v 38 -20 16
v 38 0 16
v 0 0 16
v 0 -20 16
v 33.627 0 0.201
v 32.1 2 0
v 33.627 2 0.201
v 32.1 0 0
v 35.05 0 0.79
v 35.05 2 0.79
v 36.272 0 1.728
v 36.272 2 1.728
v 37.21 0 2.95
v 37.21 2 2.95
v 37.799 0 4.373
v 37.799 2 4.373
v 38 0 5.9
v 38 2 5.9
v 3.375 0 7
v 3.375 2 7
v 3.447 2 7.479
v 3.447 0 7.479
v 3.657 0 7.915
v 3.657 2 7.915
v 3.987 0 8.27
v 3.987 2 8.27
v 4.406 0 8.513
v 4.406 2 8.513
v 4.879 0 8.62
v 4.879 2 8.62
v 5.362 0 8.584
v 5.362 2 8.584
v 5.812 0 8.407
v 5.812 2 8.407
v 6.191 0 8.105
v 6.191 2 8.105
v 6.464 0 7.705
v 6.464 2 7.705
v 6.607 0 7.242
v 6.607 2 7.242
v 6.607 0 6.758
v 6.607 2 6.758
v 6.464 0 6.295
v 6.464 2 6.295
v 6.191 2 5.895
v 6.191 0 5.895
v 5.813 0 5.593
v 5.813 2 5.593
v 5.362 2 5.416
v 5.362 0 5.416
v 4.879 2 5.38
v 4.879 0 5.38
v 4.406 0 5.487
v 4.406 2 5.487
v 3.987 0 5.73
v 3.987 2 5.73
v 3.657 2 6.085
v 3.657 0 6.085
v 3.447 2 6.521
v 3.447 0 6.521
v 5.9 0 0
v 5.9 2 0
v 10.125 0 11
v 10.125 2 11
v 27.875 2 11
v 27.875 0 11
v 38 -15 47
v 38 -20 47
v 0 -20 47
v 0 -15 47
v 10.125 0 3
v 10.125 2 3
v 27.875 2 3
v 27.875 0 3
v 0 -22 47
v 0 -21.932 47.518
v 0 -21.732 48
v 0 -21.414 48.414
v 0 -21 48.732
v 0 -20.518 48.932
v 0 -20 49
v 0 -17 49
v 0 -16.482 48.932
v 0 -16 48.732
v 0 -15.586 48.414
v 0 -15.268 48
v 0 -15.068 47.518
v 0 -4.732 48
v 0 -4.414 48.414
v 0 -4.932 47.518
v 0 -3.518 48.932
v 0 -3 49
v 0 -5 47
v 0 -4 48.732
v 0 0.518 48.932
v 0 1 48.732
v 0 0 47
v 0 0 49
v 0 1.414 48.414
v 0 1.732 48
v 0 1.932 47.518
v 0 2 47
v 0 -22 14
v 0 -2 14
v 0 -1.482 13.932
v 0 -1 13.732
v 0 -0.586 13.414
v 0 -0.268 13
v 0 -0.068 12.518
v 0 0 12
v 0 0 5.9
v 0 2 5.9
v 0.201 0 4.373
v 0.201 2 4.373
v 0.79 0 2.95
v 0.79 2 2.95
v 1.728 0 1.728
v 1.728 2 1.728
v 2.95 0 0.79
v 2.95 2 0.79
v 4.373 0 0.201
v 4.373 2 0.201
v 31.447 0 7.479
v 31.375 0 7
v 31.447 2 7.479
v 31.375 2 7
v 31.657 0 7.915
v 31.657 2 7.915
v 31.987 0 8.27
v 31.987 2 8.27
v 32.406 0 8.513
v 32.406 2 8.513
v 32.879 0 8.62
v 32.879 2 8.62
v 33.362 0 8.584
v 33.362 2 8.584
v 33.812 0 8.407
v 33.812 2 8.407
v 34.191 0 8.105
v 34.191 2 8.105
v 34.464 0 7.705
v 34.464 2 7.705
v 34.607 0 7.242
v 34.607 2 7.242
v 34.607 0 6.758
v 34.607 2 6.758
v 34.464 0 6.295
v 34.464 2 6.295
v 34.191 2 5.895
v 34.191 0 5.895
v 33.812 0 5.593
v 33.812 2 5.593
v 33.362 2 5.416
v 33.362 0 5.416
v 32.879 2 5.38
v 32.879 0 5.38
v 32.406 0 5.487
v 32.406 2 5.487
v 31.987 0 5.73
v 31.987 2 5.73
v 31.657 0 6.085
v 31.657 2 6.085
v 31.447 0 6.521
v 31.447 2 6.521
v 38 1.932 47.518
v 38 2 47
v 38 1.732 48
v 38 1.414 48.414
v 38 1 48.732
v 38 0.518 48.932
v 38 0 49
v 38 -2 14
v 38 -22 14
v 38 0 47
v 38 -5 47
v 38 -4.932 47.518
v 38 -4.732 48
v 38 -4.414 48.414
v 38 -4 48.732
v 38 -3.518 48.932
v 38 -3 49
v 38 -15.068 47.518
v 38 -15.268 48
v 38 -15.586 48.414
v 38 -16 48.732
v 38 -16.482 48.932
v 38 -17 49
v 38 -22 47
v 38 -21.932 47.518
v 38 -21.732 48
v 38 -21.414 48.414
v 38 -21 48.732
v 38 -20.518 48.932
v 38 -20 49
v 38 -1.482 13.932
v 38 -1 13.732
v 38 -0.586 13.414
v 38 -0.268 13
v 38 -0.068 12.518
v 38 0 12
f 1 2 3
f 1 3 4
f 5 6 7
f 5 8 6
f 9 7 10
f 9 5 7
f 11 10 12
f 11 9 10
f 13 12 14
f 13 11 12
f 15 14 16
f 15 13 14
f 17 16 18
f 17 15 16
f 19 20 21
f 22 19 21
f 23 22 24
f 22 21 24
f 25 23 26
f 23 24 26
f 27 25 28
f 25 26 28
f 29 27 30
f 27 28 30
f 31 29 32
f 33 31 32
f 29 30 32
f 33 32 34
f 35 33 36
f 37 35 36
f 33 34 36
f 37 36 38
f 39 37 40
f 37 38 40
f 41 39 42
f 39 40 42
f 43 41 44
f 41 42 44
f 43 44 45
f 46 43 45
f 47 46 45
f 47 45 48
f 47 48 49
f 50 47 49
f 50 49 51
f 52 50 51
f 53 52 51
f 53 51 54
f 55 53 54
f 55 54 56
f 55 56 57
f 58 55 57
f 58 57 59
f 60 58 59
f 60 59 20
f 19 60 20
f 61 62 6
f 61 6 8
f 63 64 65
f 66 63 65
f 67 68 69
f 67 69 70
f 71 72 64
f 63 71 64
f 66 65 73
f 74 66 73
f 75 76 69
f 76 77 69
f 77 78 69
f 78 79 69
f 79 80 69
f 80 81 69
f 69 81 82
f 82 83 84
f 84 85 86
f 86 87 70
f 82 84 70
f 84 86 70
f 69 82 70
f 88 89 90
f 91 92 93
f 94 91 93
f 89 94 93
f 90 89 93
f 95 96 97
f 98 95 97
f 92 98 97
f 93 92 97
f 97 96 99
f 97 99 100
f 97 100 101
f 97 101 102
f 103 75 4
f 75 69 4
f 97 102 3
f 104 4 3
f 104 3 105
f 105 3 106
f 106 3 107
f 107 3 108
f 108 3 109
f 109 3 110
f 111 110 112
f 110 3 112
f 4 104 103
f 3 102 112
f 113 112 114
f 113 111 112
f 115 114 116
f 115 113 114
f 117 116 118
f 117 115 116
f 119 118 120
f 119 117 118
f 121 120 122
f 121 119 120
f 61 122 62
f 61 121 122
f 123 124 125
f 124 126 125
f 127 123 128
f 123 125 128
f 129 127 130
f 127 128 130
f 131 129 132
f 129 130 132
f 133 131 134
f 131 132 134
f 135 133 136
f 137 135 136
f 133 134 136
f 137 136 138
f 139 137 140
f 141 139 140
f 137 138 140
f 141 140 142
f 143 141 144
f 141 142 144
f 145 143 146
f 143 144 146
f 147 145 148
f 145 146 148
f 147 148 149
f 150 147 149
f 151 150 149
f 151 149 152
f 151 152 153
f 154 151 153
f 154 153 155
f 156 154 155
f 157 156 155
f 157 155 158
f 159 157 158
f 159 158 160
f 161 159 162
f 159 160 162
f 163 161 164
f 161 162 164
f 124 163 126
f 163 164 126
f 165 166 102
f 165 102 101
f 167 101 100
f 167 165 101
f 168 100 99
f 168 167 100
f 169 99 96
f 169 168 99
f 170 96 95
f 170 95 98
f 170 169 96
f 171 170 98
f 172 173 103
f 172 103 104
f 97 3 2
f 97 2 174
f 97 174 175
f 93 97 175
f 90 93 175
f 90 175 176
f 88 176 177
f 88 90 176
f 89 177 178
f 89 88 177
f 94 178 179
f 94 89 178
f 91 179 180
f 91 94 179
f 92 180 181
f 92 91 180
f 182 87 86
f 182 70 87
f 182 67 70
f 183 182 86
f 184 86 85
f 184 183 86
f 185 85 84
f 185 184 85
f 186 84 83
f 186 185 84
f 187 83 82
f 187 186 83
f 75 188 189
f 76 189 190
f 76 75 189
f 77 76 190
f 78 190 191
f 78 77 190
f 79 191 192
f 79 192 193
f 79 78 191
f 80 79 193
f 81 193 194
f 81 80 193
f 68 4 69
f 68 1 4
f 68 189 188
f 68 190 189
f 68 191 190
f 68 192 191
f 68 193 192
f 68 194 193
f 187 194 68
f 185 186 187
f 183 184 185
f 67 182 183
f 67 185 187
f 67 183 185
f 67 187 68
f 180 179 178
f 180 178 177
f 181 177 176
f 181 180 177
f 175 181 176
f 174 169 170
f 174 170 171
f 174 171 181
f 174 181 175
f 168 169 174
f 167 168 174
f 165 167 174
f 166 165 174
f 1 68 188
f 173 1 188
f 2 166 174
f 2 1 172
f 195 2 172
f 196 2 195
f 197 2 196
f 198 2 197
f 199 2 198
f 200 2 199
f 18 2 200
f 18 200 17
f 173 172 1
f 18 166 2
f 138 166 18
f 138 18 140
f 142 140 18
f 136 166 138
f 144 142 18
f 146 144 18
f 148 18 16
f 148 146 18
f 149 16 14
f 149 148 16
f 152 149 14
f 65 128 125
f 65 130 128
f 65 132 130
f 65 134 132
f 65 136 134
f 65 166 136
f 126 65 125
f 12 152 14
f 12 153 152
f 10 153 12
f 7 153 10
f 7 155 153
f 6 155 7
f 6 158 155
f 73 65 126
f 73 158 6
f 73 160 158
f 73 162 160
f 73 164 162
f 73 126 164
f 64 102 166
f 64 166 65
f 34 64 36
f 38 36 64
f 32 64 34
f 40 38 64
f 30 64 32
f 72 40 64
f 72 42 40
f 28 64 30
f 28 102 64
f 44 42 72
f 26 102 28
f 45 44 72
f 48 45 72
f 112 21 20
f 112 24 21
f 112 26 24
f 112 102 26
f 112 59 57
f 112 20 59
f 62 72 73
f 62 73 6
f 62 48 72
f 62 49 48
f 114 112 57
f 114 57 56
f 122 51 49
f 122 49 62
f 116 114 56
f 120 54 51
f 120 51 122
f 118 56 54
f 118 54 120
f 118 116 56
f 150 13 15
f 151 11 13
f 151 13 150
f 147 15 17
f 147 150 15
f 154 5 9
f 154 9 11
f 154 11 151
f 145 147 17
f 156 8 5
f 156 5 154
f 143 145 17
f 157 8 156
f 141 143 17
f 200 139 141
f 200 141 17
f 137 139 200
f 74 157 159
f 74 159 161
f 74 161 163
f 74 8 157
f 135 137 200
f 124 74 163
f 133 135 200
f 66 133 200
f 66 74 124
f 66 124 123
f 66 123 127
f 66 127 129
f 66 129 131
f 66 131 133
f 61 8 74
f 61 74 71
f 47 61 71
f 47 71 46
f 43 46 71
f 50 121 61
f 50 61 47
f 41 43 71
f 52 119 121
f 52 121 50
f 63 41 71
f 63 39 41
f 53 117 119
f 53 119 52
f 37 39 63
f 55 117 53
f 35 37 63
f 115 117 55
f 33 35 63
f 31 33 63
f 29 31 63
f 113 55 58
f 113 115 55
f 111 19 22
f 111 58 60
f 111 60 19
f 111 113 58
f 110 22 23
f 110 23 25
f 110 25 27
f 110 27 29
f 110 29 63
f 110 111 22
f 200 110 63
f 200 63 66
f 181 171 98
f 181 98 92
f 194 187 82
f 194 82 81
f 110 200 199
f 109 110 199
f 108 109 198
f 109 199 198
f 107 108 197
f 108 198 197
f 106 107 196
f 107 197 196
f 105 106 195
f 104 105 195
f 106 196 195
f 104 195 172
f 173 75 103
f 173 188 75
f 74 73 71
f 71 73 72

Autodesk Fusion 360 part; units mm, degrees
sketch "Sketch1" plane through (0, 0, 0) normal (1, 0, 0) x (0, 0, -1)
  line L0 (0, 0) -> (-14, 0)
  line L1 (-14, 0) -> (-14, 2)
  line L2 (-14, 2) -> (0, 2)
  line L3 (0, 2) -> (0, 0)
  dimension "d1" = 14
  dimension "d2" = 2
extrude "Extrude1" add sketch "Sketch1" along normal blind 38
fillet "Fillet1" radius 5.9 4 edges at (0, 1, 14) (38, 1, 14) (38, 1, 0) (0, 1, 0)
sketch "Sketch2" plane through (0, 2, 0) normal (0, 1, 0) x (-1, 0, 0)
  arc A0 (-5.9, 0) -> (0, 5.9) centre (-5.9, 5.9) ccw
  line L0 (0, 5.9) -> (0, 8.1)
  arc A1 (0, 8.1) -> (-5.9, 14) centre (-5.9, 8.1) ccw
  line L1 (-5.9, 14) -> (-32.1, 14)
  arc A2 (-32.1, 14) -> (-38, 8.1) centre (-32.1, 8.1) ccw
  line L2 (-38, 8.1) -> (-38, 5.9)
  arc A3 (-38, 5.9) -> (-32.1, 0) centre (-32.1, 5.9) ccw
  line L3 (-32.1, 0) -> (-5.9, 0)
  line L4 (-19, 0) -> (-19, 14)
  line L5 (-19, 7) -> (-27.875, 7)
  line L6 (-27.875, 7) -> (-27.875, 3)
  line L7 (-27.875, 3) -> (-19, 3)
  line L8 (-19, 3) -> (-19, 7)
  line L9 (-27.875, 3) -> (-10.125, 3)
  line L10 (-10.125, 3) -> (-10.125, 11)
  line L11 (-10.125, 11) -> (-27.875, 11)
  line L12 (-27.875, 11) -> (-27.875, 3)
  line L13 (-10.125, 7) -> (-6.625, 7)
  circle A4 centre (-5, 7) radius 1.625
  line L14 (-27.875, 7) -> (-31.375, 7)
  circle A5 centre (-33, 7) radius 1.625
  dimension "d7" = 8.875
  dimension "d8" = 4
  dimension "d9" = 17.75
  dimension "d10" = 8
  dimension "d11" = 3.5
  dimension "d12" = 3.25
  dimension "d13" = 3.5
  dimension "d14" = 3.25
extrude "Extrude2" cut sketch "Sketch2" against normal blind 2 contours A4 | A5 | L4 L5 L6 L7 L8 L9 L12 | L4 L8 L9 L10 L11 | L4 L5 L11 L12
sketch "Sketch3" plane through (0, 2, 0) normal (0, 1, 0) x (-1, 0, 0)
  circle A0 centre (-33, 7) radius 1.625
  circle A1 centre (-5, 7) radius 1.625
  line L0 (-10.125, 3) -> (-27.875, 3)
  line L1 (-27.875, 3) -> (-27.875, 11)
  line L2 (-27.875, 11) -> (-10.125, 11)
  line L3 (-10.125, 11) -> (-10.125, 3)
  arc A2 (-5.9, 0) -> (0, 5.9) centre (-5.9, 5.9) ccw
  line L4 (0, 5.9) -> (0, 8.1)
  arc A3 (0, 8.1) -> (-5.9, 14) centre (-5.9, 8.1) ccw
  line L5 (-5.9, 14) -> (-32.1, 14)
  arc A4 (-32.1, 14) -> (-38, 8.1) centre (-32.1, 8.1) ccw
  line L6 (-38, 8.1) -> (-38, 5.9)
  arc A5 (-38, 5.9) -> (-32.1, 0) centre (-32.1, 5.9) ccw
  line L7 (-32.1, 0) -> (-5.9, 0)
  line L8 (-32.1, 14) -> (-32.1, 45)
  line L9 (-32.1, 45) -> (-38, 45)
  line L10 (-38, 45) -> (-38, 8.1)
  line L11 (-38, 8.1) -> (-32.1, 8.1)
  line L12 (-32.1, 8.1) -> (-32.1, 45)
  line L13 (-38, 45) -> (0, 45)
  line L14 (0, 45) -> (0, 8.1)
  line L15 (0, 8.1) -> (-38, 8.1)
  line L16 (-38, 8.1) -> (-38, 45)
  dimension "d17" = 31
extrude "Extrude3" add sketch "Sketch3" against normal blind 2 contours A4 L8 L9 L10 L12 L13 L16 | A3 L5 L8 L12 L13 L14
sketch "Sketch4" plane through (38, 0, 0) normal (1, 0, 0) x (0, 0, -1)
  line L0 (-5.9, 0) -> (-5.9, 2)
  line L1 (-5.9, 2) -> (-45, 2)
  line L2 (-45, 2) -> (-45, 0)
  line L3 (-45, 0) -> (-5.9, 0)
  line L4 (-45, 0) -> (-45, -5)
  line L5 (-45, -5) -> (-47, -5)
  line L6 (-47, -5) -> (-45, -5)
  line L7 (-45, -5) -> (-45, 2)
  line L8 (-45, 2) -> (-47, 2)
  line L9 (-47, 2) -> (-47, -5)
  line L10 (-45, 0) -> (-14, 0)
  line L11 (-14, 0) -> (-14, -20)
  line L12 (-14, -20) -> (-45, -20)
  line L13 (-45, -20) -> (-45, -15)
  line L14 (-45, -15) -> (-47, -15)
  line L15 (-47, -15) -> (-47, -22)
  line L16 (-47, -22) -> (-14, -22)
  line L17 (-14, -22) -> (-12, -22)
  line L18 (-12, -22) -> (-12, 0)
  line L19 (-12, 0) -> (-14, 0)
  line L20 (-14, 0) -> (-14, -22)
  dimension "d20" = 5
  dimension "d21" = 2
  dimension "d22" = 31
  dimension "d23" = 20
  dimension "d24" = 31
  dimension "d25" = 5
  dimension "d26" = 2
  dimension "d27" = 7
  dimension "d28" = 33
  dimension "d29" = 2
  dimension "d30" = 22
extrude "Extrude4" add sketch "Sketch4" against normal blind 38 contours L3 L11 L17 L18 L19 L20 | L2 L4 L5 L6 L7 L8 L9 | L12 L13 L14 L15 L16 L20
move_face "MoveFace1" by (0, 0, 2) 6 faces at (25.3333, -14.6667, 12) (25.3333, -6.6667, 14) (25.3333, -17.3333, 47) (25.3333, -18.3333, 45) (25.3333, -1.6667, 45) (25.3333, -0.3333, 47)
fillet "Fillet2" radius 2 1 edges at (19, 0, 14)
fillet "Fillet3" radius 2 1 edges at (19, 2, 49)
fillet "Fillet4" radius 2 1 edges at (19, -22, 49)
fillet "Fillet5" radius 2 2 edges at (19, -5, 49) (19, -15, 49)
equation "d7 = ( 17.75 / 2 ) * 1 mm"
equation "d9 = 8.875 mm * 2"
equation "d10 = 4.000 mm * 2"
